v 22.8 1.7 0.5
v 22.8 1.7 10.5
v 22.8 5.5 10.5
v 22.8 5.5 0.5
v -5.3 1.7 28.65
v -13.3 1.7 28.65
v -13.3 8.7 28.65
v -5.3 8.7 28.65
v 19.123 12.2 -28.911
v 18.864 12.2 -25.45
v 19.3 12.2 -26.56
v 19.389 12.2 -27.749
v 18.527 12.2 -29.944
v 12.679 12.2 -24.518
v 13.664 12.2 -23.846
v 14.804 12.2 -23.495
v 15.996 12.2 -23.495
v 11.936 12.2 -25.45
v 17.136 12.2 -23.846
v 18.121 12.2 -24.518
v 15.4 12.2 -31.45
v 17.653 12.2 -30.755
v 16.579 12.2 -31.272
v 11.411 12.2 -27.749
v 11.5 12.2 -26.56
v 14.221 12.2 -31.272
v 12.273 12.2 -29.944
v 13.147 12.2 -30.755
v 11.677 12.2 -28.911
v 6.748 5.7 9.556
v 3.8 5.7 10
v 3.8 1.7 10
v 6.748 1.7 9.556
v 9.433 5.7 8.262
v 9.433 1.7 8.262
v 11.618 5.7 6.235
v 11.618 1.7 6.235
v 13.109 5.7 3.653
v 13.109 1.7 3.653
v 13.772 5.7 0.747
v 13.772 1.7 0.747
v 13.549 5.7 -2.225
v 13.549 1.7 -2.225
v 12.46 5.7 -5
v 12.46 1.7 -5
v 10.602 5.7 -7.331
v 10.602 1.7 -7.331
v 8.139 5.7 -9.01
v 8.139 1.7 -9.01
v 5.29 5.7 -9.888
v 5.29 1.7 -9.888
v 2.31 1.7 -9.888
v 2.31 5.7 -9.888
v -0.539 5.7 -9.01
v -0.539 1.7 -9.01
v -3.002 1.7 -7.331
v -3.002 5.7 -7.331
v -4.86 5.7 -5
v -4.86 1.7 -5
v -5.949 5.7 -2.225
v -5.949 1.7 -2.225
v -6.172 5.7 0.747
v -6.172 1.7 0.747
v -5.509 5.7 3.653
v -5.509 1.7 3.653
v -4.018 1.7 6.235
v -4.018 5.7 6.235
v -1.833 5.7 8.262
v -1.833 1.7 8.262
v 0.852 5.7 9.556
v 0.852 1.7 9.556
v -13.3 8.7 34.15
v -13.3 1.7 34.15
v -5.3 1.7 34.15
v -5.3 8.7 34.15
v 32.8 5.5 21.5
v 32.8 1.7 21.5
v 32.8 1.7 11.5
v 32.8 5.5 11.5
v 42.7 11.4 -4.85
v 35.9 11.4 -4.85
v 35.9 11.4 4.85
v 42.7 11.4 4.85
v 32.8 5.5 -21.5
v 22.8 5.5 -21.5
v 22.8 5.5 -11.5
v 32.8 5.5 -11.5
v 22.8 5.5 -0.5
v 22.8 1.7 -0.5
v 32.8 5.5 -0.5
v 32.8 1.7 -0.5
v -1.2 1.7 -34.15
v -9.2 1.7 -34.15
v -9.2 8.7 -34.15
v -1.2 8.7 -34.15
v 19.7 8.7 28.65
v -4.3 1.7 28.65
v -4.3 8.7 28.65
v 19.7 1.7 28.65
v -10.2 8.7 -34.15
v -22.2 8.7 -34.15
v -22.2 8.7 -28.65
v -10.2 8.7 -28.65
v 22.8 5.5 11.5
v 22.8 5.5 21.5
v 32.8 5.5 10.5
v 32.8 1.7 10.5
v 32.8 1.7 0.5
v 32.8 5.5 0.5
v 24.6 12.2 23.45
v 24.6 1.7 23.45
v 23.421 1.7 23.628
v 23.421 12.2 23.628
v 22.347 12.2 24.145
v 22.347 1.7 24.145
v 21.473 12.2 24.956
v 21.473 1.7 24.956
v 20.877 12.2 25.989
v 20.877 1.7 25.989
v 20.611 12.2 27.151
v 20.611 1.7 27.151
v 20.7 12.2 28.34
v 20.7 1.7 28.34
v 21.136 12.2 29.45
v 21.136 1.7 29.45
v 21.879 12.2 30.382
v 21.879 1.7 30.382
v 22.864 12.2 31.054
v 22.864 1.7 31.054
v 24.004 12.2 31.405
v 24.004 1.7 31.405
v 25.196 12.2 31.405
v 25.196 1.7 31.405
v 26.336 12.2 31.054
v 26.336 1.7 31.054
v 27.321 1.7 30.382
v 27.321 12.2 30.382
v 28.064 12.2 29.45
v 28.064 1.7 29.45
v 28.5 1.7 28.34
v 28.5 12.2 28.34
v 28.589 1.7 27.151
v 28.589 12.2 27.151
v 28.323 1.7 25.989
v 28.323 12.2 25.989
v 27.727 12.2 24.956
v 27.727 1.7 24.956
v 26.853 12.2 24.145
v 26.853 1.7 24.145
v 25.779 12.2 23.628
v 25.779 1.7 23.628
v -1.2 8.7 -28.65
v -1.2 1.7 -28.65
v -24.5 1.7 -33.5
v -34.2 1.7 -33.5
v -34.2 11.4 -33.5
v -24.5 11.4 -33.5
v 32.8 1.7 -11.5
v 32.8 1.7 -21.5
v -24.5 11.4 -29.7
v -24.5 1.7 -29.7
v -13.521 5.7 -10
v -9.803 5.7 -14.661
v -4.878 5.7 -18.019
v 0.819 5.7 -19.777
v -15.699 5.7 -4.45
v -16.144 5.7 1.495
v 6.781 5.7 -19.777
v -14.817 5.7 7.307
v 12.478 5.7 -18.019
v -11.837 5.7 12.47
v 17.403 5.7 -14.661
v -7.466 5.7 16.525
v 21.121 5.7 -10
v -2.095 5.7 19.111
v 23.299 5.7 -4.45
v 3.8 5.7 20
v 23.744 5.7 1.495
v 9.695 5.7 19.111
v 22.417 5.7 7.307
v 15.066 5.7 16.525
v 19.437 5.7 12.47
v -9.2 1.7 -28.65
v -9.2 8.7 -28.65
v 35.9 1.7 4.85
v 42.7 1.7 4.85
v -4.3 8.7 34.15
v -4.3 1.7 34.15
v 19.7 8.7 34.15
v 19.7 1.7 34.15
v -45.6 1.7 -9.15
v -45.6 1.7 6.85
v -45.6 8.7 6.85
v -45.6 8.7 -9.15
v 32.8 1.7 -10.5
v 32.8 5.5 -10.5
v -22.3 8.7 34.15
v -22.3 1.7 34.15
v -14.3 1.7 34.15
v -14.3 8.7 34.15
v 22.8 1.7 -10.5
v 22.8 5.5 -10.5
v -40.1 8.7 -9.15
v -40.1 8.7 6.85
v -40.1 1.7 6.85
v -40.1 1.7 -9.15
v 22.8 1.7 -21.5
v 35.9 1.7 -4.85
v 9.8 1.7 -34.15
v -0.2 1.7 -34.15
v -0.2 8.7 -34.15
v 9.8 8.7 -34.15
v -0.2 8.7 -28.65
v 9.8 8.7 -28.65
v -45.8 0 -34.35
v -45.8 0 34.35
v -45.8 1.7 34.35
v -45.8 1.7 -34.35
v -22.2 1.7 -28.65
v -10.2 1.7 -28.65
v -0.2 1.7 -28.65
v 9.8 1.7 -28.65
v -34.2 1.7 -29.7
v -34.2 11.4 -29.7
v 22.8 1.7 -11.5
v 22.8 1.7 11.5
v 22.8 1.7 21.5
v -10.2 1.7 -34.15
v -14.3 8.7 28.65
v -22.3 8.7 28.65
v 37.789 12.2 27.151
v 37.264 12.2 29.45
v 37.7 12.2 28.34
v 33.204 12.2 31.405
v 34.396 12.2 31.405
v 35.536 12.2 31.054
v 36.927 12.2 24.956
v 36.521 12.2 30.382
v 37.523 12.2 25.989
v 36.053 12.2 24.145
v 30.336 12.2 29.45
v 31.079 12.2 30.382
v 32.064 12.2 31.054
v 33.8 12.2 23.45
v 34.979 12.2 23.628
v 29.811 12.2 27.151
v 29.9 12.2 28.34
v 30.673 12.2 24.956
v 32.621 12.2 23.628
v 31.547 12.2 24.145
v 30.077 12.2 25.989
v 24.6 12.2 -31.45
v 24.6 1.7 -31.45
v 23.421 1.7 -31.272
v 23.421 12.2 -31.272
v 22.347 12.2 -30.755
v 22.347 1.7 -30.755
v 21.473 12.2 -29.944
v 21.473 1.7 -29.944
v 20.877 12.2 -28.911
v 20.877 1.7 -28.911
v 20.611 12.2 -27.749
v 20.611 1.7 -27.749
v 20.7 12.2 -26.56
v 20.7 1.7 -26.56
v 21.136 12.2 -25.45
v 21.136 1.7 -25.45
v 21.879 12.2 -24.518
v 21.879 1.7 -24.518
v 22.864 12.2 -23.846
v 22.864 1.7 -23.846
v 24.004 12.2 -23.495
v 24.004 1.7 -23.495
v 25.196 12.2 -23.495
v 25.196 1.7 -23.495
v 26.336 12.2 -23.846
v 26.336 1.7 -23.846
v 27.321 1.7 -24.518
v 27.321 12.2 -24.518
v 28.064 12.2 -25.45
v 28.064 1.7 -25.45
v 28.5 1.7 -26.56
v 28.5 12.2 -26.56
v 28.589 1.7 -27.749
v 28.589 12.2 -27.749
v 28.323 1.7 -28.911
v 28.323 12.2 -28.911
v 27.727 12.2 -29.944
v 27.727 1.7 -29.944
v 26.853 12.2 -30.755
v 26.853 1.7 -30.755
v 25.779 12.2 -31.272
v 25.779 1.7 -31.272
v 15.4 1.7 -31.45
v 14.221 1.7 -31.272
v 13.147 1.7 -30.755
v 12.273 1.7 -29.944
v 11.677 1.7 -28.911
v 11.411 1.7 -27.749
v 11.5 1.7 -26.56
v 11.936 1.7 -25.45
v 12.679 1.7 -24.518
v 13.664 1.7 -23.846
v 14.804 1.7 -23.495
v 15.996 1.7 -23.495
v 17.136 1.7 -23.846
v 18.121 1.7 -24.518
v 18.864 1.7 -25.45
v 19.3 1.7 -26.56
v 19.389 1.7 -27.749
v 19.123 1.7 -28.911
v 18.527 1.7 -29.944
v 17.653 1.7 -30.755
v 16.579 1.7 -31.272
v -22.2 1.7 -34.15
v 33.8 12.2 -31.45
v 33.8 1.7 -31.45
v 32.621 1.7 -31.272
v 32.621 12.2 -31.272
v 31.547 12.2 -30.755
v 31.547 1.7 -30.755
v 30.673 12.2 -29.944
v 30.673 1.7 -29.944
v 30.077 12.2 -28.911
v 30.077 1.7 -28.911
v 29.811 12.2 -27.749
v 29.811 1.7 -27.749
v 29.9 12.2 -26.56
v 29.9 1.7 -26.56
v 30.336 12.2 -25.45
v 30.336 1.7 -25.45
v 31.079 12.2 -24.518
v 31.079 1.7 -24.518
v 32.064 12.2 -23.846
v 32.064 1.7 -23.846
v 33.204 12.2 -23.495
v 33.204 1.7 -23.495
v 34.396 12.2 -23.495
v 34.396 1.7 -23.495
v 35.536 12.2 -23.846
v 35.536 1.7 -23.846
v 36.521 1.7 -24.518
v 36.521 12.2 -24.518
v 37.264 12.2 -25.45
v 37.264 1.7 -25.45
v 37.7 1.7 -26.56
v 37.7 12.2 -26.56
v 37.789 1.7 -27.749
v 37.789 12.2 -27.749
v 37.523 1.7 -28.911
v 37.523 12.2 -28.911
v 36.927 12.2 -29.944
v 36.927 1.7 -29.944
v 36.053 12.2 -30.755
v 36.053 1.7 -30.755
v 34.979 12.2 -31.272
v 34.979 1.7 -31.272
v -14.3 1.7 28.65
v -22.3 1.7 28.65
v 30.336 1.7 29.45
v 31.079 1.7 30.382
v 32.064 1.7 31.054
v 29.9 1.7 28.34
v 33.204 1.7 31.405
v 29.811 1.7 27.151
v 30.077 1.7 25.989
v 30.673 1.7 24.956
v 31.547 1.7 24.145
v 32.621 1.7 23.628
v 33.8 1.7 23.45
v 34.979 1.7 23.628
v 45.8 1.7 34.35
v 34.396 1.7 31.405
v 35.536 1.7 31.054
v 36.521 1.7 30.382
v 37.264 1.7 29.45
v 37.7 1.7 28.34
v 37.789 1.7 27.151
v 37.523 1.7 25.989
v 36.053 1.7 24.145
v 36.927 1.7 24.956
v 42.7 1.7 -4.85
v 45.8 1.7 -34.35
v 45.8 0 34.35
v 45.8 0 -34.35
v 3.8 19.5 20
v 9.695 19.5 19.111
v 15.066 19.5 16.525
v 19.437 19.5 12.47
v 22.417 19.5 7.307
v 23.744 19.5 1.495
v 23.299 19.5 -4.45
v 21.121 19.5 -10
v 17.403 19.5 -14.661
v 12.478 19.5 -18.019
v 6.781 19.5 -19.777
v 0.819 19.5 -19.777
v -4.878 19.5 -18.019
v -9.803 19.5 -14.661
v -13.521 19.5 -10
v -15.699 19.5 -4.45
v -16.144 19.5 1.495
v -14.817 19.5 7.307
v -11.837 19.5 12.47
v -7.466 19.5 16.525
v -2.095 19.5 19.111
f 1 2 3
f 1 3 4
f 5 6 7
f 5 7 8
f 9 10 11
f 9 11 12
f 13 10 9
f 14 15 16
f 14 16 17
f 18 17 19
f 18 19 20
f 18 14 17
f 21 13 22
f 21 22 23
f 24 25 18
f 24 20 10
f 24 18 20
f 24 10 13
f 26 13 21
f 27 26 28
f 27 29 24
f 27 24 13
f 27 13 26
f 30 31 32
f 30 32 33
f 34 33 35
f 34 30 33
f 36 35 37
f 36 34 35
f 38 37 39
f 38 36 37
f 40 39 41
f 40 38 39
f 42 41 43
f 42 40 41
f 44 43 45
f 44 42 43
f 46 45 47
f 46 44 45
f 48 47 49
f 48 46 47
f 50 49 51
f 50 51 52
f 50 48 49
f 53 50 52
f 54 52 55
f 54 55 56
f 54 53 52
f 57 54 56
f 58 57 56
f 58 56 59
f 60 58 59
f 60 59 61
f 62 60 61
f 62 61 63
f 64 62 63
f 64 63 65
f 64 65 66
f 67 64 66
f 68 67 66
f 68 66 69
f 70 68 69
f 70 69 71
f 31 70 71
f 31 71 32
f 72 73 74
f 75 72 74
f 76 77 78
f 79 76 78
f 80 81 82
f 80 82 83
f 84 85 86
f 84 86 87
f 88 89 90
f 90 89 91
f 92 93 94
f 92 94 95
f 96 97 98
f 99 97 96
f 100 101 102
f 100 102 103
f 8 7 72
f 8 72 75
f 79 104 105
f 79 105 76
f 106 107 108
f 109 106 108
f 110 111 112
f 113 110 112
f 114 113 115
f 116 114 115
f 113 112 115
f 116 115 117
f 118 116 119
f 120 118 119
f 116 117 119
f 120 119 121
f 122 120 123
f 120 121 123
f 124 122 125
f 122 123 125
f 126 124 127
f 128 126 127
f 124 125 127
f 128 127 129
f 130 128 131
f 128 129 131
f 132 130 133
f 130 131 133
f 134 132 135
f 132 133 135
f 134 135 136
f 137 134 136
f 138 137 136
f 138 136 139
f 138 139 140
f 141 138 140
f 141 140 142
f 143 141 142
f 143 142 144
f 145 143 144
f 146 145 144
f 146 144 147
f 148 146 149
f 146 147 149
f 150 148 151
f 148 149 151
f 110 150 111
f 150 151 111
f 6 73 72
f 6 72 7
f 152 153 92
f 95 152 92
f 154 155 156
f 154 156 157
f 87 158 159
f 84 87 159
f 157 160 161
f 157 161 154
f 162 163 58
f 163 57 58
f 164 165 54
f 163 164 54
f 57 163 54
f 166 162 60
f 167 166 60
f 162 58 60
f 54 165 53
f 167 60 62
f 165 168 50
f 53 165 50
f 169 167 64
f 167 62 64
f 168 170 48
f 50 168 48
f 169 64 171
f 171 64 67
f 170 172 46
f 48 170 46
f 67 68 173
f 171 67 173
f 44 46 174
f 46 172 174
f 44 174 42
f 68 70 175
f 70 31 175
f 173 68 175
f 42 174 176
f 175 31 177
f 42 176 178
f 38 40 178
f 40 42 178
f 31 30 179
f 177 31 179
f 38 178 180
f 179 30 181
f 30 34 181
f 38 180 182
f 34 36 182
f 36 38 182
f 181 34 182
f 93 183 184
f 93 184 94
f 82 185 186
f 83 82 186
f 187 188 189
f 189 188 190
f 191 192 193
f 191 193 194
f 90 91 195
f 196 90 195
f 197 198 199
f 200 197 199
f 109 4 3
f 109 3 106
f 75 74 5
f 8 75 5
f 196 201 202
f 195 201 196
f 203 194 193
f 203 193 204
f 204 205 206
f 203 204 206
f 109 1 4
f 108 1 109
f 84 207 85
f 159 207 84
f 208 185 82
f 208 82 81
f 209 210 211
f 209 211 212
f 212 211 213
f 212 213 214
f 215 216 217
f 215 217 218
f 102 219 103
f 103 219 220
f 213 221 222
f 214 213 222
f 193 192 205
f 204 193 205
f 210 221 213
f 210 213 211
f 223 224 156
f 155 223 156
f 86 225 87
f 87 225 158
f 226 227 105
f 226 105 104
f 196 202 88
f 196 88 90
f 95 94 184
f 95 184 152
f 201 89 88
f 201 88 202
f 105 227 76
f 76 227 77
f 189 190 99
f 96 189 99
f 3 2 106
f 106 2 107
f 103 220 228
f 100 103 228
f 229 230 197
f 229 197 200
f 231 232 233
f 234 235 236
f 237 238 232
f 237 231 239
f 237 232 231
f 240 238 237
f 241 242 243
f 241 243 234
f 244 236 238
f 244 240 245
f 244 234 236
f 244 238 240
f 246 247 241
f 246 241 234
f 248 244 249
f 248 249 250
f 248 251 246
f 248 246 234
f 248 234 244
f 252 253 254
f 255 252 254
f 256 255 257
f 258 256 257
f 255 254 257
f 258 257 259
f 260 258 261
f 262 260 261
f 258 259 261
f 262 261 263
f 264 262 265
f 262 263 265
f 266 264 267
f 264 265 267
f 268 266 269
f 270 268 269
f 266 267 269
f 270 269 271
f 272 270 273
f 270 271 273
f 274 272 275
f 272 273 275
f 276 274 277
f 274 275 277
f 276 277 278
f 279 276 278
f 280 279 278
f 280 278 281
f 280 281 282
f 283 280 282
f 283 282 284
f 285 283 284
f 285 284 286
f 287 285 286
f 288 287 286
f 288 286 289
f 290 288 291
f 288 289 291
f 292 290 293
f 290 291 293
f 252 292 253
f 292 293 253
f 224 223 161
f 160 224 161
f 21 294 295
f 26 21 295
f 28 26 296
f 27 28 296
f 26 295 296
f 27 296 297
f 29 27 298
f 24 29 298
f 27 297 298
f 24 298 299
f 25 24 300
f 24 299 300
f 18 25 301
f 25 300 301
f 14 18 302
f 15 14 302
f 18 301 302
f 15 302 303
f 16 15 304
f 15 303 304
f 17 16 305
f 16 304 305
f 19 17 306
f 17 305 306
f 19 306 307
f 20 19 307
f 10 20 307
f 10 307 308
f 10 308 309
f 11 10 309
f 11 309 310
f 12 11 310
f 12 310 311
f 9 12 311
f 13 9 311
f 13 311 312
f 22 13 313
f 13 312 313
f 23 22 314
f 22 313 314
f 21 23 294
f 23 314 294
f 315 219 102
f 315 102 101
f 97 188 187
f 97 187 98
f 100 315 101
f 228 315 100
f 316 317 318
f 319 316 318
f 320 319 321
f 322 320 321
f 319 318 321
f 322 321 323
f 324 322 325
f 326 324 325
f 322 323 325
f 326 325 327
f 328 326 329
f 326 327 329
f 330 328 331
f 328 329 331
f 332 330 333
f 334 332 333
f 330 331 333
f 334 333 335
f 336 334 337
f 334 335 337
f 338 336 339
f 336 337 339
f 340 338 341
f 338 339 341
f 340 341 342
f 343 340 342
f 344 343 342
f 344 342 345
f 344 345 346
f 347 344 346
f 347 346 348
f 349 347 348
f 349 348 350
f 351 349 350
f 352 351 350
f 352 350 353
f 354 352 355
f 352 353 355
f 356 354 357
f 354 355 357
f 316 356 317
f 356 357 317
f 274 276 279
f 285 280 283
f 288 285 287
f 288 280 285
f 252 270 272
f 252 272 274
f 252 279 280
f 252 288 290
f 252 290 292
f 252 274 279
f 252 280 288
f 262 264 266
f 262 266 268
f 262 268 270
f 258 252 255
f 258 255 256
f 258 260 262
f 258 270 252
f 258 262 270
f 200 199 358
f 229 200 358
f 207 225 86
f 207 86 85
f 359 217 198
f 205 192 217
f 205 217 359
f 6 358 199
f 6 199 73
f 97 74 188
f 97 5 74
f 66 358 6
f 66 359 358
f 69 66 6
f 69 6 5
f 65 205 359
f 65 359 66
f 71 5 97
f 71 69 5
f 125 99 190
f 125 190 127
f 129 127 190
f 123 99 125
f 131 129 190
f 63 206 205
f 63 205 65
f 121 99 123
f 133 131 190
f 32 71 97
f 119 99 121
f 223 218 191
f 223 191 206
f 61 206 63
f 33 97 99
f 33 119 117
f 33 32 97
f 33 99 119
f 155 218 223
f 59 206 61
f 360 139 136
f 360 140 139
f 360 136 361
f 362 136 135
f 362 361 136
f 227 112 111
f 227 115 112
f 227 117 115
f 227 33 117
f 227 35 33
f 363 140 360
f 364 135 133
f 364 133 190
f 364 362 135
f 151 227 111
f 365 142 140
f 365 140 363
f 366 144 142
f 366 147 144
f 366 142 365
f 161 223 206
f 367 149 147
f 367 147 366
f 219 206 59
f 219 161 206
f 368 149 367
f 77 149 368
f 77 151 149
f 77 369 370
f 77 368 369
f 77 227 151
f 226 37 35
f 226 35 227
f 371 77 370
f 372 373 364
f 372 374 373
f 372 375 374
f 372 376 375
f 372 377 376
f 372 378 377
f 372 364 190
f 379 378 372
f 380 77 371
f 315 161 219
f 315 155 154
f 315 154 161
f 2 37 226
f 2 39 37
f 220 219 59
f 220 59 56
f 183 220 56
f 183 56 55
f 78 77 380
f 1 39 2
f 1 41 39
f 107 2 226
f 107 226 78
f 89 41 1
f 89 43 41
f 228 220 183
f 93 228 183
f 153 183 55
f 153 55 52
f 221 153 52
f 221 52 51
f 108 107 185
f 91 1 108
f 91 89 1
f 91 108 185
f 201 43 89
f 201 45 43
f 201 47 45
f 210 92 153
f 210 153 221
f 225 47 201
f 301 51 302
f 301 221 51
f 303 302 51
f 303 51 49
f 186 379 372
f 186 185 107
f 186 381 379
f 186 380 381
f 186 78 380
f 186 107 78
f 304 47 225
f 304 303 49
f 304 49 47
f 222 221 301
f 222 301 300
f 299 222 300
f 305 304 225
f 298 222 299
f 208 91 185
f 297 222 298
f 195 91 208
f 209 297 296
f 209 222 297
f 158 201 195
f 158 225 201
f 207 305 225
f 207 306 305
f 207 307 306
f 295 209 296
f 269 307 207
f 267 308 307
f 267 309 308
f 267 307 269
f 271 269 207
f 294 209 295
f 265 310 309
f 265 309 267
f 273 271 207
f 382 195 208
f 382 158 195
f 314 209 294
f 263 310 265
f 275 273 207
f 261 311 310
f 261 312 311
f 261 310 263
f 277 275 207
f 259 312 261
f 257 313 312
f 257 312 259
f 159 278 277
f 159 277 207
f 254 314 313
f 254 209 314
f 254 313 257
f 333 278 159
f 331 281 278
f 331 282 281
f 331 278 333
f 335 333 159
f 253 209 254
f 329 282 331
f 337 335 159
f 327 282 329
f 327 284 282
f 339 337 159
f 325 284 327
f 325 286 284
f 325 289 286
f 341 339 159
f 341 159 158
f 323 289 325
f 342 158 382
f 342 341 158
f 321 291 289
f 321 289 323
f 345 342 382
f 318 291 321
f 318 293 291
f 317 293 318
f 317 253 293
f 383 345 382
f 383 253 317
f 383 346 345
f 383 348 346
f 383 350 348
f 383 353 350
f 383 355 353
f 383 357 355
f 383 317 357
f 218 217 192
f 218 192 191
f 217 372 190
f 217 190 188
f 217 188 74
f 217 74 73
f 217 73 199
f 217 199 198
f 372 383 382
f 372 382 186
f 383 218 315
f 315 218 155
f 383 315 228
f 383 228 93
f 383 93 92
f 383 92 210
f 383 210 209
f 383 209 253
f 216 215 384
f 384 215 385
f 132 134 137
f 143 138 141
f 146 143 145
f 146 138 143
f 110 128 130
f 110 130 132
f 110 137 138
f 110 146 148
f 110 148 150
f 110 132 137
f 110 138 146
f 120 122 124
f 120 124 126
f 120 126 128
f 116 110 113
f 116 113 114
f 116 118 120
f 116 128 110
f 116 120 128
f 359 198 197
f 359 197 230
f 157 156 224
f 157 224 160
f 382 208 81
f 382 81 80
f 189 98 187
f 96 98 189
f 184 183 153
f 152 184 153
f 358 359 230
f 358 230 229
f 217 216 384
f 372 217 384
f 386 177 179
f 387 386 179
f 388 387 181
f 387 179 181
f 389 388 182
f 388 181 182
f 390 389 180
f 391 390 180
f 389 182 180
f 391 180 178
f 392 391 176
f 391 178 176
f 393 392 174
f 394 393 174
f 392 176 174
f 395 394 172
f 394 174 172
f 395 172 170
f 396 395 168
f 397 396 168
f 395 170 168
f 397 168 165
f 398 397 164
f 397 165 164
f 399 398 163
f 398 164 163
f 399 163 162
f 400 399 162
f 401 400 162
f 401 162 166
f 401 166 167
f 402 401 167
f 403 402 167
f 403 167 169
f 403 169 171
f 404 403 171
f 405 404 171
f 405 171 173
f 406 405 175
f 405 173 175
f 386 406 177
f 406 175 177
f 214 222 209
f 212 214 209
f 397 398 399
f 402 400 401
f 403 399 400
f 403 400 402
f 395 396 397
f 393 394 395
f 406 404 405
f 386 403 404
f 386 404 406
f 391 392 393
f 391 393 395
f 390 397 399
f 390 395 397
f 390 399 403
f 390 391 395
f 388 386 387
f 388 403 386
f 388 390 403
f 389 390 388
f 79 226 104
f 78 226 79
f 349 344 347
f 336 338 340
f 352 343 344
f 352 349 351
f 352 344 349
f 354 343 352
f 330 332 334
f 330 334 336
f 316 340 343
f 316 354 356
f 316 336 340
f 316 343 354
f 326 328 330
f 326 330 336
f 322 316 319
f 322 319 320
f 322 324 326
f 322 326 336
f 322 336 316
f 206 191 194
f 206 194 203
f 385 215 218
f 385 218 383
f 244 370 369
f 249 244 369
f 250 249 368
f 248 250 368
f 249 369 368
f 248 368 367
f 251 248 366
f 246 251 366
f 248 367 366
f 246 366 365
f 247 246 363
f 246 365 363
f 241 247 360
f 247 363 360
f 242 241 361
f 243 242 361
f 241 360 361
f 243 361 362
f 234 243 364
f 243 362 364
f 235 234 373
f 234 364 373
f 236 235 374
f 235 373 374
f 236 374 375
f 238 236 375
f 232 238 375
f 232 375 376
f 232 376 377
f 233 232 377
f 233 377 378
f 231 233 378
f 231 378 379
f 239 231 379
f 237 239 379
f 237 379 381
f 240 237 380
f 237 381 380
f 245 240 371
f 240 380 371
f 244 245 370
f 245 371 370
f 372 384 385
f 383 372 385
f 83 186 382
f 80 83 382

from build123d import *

# Parameters (mm, degrees)
SKETCH1_W           = 91.6
SKETCH1_H           = 68.7
BOSS_EXTRUDE1_DEPTH = 1.7
BOSS_EXTRUDE2_START = 4
SKETCH2_R           = 20
BOSS_EXTRUDE2_DEPTH = 13.8
SKETCH3_R           = 4
BOSS_EXTRUDE3_DEPTH = 10.5
SKETCH4_W           = 10
SKETCH4_H           = 10
BOSS_EXTRUDE4_DEPTH = 3.8
SKETCH6_R           = 10
BOSS_EXTRUDE5_DEPTH = 17.8
SKETCH7_W           = 6.8
SKETCH7_H           = 9.7
SKETCH7_W_2         = 9.7
SKETCH7_H_2         = 3.8
BOSS_EXTRUDE6_DEPTH = 9.7
SKETCH8_W           = 24
SKETCH8_H           = 5.5
SKETCH8_W_2         = 8
SKETCH8_W_3         = 5.5
SKETCH8_H_2         = 16
SKETCH8_W_4         = 12
SKETCH8_W_5         = 10
BOSS_EXTRUDE7_DEPTH = 7


with BuildPart() as part:
    # Sketch1 → Boss-Extrude1 (new body)
    with BuildSketch(Plane(origin=(0, 0, 0), x_dir=(1, 0, 0), z_dir=(0, 1, 0))):
        Rectangle(SKETCH1_W, SKETCH1_H)
    extrude(amount=BOSS_EXTRUDE1_DEPTH)

    # Sketch3 → Boss-Extrude3 (add)
    with BuildSketch(Plane(origin=(0, 1.7, 0), x_dir=(1, 0, 0), z_dir=(0, 1, 0))):
        with Locations(Location((15.4, 27.45, 0), (0, 0, 90))):
            Circle(SKETCH3_R)
        with Locations(Location((24.6, 27.45, 0), (0, 0, 90))):
            Circle(SKETCH3_R)
        with Locations(Location((33.8, 27.45, 0), (0, 0, 90))):
            Circle(SKETCH3_R)
        with Locations(Location((33.8, -27.45, 0), (0, 0, 90))):
            Circle(SKETCH3_R)
        with Locations(Location((24.6, -27.45, 0), (0, 0, 90))):
            Circle(SKETCH3_R)
    extrude(amount=BOSS_EXTRUDE3_DEPTH)

    # Sketch4 → Boss-Extrude4 (add)
    with BuildSketch(Plane(origin=(0, 1.7, 0), x_dir=(1, 0, 0), z_dir=(0, 1, 0))):
        with Locations((27.8, 5.5)):
            Rectangle(SKETCH4_W, SKETCH4_H)
        with Locations((27.8, 16.5)):
            Rectangle(SKETCH4_W, SKETCH4_H)
        with Locations((27.8, -5.5)):
            Rectangle(SKETCH4_W, SKETCH4_H)
        with Locations((27.8, -16.5)):
            Rectangle(SKETCH4_W, SKETCH4_H)
    extrude(amount=BOSS_EXTRUDE4_DEPTH)



with BuildPart() as body_2:
    # Sketch2 → Boss-Extrude2 (new body)
    with BuildSketch(Plane(origin=(0, 1.7, 0), x_dir=(1, 0, 0), z_dir=(0, 1, 0)).offset(BOSS_EXTRUDE2_START)):
        with Locations(Location((3.8, 0, 0), (0, 0, 270))):
            Circle(SKETCH2_R)
    extrude(amount=BOSS_EXTRUDE2_DEPTH)


with BuildPart() as part_1:
    add(part.part)

    add(body_2.part)  # Boss-Extrude5 merges body 2
    # Sketch6 → Boss-Extrude5 (add)
    with BuildSketch(Plane(origin=(0, 19.5, 0), x_dir=(1, 0, 0), z_dir=(0, 1, 0))):
        with Locations(Location((3.8, 0, 0), (0, 0, 270))):
            Circle(SKETCH6_R)
    extrude(amount=-BOSS_EXTRUDE5_DEPTH)

    # Sketch7 → Boss-Extrude6 (add)
    with BuildSketch(Plane(origin=(0, 1.7, 0), x_dir=(1, 0, 0), z_dir=(0, 1, 0))):
        with Locations((39.3, 0)):
            Rectangle(SKETCH7_W, SKETCH7_H)
        with Locations((-29.35, 31.6)):
            Rectangle(SKETCH7_W_2, SKETCH7_H_2)
    extrude(amount=BOSS_EXTRUDE6_DEPTH)

    # Sketch8 → Boss-Extrude7 (add)
    with BuildSketch(Plane(origin=(0, 1.7, 0), x_dir=(1, 0, 0), z_dir=(0, 1, 0))):
        with Locations((7.7, -31.4)):
            Rectangle(SKETCH8_W, SKETCH8_H)
        with Locations((-9.3, -31.4)):
            Rectangle(SKETCH8_W_2, SKETCH8_H)
        with Locations((-18.3, -31.4)):
            Rectangle(SKETCH8_W_2, SKETCH8_H)
        with Locations((-42.85, 1.15)):
            Rectangle(SKETCH8_W_3, SKETCH8_H_2)
        with Locations((-16.2, 31.4)):
            Rectangle(SKETCH8_W_4, SKETCH8_H)
        with Locations((-5.2, 31.4)):
            Rectangle(SKETCH8_W_2, SKETCH8_H)
        with Locations((4.8, 31.4)):
            Rectangle(SKETCH8_W_5, SKETCH8_H)
    extrude(amount=BOSS_EXTRUDE7_DEPTH)


solid = part_1.part
